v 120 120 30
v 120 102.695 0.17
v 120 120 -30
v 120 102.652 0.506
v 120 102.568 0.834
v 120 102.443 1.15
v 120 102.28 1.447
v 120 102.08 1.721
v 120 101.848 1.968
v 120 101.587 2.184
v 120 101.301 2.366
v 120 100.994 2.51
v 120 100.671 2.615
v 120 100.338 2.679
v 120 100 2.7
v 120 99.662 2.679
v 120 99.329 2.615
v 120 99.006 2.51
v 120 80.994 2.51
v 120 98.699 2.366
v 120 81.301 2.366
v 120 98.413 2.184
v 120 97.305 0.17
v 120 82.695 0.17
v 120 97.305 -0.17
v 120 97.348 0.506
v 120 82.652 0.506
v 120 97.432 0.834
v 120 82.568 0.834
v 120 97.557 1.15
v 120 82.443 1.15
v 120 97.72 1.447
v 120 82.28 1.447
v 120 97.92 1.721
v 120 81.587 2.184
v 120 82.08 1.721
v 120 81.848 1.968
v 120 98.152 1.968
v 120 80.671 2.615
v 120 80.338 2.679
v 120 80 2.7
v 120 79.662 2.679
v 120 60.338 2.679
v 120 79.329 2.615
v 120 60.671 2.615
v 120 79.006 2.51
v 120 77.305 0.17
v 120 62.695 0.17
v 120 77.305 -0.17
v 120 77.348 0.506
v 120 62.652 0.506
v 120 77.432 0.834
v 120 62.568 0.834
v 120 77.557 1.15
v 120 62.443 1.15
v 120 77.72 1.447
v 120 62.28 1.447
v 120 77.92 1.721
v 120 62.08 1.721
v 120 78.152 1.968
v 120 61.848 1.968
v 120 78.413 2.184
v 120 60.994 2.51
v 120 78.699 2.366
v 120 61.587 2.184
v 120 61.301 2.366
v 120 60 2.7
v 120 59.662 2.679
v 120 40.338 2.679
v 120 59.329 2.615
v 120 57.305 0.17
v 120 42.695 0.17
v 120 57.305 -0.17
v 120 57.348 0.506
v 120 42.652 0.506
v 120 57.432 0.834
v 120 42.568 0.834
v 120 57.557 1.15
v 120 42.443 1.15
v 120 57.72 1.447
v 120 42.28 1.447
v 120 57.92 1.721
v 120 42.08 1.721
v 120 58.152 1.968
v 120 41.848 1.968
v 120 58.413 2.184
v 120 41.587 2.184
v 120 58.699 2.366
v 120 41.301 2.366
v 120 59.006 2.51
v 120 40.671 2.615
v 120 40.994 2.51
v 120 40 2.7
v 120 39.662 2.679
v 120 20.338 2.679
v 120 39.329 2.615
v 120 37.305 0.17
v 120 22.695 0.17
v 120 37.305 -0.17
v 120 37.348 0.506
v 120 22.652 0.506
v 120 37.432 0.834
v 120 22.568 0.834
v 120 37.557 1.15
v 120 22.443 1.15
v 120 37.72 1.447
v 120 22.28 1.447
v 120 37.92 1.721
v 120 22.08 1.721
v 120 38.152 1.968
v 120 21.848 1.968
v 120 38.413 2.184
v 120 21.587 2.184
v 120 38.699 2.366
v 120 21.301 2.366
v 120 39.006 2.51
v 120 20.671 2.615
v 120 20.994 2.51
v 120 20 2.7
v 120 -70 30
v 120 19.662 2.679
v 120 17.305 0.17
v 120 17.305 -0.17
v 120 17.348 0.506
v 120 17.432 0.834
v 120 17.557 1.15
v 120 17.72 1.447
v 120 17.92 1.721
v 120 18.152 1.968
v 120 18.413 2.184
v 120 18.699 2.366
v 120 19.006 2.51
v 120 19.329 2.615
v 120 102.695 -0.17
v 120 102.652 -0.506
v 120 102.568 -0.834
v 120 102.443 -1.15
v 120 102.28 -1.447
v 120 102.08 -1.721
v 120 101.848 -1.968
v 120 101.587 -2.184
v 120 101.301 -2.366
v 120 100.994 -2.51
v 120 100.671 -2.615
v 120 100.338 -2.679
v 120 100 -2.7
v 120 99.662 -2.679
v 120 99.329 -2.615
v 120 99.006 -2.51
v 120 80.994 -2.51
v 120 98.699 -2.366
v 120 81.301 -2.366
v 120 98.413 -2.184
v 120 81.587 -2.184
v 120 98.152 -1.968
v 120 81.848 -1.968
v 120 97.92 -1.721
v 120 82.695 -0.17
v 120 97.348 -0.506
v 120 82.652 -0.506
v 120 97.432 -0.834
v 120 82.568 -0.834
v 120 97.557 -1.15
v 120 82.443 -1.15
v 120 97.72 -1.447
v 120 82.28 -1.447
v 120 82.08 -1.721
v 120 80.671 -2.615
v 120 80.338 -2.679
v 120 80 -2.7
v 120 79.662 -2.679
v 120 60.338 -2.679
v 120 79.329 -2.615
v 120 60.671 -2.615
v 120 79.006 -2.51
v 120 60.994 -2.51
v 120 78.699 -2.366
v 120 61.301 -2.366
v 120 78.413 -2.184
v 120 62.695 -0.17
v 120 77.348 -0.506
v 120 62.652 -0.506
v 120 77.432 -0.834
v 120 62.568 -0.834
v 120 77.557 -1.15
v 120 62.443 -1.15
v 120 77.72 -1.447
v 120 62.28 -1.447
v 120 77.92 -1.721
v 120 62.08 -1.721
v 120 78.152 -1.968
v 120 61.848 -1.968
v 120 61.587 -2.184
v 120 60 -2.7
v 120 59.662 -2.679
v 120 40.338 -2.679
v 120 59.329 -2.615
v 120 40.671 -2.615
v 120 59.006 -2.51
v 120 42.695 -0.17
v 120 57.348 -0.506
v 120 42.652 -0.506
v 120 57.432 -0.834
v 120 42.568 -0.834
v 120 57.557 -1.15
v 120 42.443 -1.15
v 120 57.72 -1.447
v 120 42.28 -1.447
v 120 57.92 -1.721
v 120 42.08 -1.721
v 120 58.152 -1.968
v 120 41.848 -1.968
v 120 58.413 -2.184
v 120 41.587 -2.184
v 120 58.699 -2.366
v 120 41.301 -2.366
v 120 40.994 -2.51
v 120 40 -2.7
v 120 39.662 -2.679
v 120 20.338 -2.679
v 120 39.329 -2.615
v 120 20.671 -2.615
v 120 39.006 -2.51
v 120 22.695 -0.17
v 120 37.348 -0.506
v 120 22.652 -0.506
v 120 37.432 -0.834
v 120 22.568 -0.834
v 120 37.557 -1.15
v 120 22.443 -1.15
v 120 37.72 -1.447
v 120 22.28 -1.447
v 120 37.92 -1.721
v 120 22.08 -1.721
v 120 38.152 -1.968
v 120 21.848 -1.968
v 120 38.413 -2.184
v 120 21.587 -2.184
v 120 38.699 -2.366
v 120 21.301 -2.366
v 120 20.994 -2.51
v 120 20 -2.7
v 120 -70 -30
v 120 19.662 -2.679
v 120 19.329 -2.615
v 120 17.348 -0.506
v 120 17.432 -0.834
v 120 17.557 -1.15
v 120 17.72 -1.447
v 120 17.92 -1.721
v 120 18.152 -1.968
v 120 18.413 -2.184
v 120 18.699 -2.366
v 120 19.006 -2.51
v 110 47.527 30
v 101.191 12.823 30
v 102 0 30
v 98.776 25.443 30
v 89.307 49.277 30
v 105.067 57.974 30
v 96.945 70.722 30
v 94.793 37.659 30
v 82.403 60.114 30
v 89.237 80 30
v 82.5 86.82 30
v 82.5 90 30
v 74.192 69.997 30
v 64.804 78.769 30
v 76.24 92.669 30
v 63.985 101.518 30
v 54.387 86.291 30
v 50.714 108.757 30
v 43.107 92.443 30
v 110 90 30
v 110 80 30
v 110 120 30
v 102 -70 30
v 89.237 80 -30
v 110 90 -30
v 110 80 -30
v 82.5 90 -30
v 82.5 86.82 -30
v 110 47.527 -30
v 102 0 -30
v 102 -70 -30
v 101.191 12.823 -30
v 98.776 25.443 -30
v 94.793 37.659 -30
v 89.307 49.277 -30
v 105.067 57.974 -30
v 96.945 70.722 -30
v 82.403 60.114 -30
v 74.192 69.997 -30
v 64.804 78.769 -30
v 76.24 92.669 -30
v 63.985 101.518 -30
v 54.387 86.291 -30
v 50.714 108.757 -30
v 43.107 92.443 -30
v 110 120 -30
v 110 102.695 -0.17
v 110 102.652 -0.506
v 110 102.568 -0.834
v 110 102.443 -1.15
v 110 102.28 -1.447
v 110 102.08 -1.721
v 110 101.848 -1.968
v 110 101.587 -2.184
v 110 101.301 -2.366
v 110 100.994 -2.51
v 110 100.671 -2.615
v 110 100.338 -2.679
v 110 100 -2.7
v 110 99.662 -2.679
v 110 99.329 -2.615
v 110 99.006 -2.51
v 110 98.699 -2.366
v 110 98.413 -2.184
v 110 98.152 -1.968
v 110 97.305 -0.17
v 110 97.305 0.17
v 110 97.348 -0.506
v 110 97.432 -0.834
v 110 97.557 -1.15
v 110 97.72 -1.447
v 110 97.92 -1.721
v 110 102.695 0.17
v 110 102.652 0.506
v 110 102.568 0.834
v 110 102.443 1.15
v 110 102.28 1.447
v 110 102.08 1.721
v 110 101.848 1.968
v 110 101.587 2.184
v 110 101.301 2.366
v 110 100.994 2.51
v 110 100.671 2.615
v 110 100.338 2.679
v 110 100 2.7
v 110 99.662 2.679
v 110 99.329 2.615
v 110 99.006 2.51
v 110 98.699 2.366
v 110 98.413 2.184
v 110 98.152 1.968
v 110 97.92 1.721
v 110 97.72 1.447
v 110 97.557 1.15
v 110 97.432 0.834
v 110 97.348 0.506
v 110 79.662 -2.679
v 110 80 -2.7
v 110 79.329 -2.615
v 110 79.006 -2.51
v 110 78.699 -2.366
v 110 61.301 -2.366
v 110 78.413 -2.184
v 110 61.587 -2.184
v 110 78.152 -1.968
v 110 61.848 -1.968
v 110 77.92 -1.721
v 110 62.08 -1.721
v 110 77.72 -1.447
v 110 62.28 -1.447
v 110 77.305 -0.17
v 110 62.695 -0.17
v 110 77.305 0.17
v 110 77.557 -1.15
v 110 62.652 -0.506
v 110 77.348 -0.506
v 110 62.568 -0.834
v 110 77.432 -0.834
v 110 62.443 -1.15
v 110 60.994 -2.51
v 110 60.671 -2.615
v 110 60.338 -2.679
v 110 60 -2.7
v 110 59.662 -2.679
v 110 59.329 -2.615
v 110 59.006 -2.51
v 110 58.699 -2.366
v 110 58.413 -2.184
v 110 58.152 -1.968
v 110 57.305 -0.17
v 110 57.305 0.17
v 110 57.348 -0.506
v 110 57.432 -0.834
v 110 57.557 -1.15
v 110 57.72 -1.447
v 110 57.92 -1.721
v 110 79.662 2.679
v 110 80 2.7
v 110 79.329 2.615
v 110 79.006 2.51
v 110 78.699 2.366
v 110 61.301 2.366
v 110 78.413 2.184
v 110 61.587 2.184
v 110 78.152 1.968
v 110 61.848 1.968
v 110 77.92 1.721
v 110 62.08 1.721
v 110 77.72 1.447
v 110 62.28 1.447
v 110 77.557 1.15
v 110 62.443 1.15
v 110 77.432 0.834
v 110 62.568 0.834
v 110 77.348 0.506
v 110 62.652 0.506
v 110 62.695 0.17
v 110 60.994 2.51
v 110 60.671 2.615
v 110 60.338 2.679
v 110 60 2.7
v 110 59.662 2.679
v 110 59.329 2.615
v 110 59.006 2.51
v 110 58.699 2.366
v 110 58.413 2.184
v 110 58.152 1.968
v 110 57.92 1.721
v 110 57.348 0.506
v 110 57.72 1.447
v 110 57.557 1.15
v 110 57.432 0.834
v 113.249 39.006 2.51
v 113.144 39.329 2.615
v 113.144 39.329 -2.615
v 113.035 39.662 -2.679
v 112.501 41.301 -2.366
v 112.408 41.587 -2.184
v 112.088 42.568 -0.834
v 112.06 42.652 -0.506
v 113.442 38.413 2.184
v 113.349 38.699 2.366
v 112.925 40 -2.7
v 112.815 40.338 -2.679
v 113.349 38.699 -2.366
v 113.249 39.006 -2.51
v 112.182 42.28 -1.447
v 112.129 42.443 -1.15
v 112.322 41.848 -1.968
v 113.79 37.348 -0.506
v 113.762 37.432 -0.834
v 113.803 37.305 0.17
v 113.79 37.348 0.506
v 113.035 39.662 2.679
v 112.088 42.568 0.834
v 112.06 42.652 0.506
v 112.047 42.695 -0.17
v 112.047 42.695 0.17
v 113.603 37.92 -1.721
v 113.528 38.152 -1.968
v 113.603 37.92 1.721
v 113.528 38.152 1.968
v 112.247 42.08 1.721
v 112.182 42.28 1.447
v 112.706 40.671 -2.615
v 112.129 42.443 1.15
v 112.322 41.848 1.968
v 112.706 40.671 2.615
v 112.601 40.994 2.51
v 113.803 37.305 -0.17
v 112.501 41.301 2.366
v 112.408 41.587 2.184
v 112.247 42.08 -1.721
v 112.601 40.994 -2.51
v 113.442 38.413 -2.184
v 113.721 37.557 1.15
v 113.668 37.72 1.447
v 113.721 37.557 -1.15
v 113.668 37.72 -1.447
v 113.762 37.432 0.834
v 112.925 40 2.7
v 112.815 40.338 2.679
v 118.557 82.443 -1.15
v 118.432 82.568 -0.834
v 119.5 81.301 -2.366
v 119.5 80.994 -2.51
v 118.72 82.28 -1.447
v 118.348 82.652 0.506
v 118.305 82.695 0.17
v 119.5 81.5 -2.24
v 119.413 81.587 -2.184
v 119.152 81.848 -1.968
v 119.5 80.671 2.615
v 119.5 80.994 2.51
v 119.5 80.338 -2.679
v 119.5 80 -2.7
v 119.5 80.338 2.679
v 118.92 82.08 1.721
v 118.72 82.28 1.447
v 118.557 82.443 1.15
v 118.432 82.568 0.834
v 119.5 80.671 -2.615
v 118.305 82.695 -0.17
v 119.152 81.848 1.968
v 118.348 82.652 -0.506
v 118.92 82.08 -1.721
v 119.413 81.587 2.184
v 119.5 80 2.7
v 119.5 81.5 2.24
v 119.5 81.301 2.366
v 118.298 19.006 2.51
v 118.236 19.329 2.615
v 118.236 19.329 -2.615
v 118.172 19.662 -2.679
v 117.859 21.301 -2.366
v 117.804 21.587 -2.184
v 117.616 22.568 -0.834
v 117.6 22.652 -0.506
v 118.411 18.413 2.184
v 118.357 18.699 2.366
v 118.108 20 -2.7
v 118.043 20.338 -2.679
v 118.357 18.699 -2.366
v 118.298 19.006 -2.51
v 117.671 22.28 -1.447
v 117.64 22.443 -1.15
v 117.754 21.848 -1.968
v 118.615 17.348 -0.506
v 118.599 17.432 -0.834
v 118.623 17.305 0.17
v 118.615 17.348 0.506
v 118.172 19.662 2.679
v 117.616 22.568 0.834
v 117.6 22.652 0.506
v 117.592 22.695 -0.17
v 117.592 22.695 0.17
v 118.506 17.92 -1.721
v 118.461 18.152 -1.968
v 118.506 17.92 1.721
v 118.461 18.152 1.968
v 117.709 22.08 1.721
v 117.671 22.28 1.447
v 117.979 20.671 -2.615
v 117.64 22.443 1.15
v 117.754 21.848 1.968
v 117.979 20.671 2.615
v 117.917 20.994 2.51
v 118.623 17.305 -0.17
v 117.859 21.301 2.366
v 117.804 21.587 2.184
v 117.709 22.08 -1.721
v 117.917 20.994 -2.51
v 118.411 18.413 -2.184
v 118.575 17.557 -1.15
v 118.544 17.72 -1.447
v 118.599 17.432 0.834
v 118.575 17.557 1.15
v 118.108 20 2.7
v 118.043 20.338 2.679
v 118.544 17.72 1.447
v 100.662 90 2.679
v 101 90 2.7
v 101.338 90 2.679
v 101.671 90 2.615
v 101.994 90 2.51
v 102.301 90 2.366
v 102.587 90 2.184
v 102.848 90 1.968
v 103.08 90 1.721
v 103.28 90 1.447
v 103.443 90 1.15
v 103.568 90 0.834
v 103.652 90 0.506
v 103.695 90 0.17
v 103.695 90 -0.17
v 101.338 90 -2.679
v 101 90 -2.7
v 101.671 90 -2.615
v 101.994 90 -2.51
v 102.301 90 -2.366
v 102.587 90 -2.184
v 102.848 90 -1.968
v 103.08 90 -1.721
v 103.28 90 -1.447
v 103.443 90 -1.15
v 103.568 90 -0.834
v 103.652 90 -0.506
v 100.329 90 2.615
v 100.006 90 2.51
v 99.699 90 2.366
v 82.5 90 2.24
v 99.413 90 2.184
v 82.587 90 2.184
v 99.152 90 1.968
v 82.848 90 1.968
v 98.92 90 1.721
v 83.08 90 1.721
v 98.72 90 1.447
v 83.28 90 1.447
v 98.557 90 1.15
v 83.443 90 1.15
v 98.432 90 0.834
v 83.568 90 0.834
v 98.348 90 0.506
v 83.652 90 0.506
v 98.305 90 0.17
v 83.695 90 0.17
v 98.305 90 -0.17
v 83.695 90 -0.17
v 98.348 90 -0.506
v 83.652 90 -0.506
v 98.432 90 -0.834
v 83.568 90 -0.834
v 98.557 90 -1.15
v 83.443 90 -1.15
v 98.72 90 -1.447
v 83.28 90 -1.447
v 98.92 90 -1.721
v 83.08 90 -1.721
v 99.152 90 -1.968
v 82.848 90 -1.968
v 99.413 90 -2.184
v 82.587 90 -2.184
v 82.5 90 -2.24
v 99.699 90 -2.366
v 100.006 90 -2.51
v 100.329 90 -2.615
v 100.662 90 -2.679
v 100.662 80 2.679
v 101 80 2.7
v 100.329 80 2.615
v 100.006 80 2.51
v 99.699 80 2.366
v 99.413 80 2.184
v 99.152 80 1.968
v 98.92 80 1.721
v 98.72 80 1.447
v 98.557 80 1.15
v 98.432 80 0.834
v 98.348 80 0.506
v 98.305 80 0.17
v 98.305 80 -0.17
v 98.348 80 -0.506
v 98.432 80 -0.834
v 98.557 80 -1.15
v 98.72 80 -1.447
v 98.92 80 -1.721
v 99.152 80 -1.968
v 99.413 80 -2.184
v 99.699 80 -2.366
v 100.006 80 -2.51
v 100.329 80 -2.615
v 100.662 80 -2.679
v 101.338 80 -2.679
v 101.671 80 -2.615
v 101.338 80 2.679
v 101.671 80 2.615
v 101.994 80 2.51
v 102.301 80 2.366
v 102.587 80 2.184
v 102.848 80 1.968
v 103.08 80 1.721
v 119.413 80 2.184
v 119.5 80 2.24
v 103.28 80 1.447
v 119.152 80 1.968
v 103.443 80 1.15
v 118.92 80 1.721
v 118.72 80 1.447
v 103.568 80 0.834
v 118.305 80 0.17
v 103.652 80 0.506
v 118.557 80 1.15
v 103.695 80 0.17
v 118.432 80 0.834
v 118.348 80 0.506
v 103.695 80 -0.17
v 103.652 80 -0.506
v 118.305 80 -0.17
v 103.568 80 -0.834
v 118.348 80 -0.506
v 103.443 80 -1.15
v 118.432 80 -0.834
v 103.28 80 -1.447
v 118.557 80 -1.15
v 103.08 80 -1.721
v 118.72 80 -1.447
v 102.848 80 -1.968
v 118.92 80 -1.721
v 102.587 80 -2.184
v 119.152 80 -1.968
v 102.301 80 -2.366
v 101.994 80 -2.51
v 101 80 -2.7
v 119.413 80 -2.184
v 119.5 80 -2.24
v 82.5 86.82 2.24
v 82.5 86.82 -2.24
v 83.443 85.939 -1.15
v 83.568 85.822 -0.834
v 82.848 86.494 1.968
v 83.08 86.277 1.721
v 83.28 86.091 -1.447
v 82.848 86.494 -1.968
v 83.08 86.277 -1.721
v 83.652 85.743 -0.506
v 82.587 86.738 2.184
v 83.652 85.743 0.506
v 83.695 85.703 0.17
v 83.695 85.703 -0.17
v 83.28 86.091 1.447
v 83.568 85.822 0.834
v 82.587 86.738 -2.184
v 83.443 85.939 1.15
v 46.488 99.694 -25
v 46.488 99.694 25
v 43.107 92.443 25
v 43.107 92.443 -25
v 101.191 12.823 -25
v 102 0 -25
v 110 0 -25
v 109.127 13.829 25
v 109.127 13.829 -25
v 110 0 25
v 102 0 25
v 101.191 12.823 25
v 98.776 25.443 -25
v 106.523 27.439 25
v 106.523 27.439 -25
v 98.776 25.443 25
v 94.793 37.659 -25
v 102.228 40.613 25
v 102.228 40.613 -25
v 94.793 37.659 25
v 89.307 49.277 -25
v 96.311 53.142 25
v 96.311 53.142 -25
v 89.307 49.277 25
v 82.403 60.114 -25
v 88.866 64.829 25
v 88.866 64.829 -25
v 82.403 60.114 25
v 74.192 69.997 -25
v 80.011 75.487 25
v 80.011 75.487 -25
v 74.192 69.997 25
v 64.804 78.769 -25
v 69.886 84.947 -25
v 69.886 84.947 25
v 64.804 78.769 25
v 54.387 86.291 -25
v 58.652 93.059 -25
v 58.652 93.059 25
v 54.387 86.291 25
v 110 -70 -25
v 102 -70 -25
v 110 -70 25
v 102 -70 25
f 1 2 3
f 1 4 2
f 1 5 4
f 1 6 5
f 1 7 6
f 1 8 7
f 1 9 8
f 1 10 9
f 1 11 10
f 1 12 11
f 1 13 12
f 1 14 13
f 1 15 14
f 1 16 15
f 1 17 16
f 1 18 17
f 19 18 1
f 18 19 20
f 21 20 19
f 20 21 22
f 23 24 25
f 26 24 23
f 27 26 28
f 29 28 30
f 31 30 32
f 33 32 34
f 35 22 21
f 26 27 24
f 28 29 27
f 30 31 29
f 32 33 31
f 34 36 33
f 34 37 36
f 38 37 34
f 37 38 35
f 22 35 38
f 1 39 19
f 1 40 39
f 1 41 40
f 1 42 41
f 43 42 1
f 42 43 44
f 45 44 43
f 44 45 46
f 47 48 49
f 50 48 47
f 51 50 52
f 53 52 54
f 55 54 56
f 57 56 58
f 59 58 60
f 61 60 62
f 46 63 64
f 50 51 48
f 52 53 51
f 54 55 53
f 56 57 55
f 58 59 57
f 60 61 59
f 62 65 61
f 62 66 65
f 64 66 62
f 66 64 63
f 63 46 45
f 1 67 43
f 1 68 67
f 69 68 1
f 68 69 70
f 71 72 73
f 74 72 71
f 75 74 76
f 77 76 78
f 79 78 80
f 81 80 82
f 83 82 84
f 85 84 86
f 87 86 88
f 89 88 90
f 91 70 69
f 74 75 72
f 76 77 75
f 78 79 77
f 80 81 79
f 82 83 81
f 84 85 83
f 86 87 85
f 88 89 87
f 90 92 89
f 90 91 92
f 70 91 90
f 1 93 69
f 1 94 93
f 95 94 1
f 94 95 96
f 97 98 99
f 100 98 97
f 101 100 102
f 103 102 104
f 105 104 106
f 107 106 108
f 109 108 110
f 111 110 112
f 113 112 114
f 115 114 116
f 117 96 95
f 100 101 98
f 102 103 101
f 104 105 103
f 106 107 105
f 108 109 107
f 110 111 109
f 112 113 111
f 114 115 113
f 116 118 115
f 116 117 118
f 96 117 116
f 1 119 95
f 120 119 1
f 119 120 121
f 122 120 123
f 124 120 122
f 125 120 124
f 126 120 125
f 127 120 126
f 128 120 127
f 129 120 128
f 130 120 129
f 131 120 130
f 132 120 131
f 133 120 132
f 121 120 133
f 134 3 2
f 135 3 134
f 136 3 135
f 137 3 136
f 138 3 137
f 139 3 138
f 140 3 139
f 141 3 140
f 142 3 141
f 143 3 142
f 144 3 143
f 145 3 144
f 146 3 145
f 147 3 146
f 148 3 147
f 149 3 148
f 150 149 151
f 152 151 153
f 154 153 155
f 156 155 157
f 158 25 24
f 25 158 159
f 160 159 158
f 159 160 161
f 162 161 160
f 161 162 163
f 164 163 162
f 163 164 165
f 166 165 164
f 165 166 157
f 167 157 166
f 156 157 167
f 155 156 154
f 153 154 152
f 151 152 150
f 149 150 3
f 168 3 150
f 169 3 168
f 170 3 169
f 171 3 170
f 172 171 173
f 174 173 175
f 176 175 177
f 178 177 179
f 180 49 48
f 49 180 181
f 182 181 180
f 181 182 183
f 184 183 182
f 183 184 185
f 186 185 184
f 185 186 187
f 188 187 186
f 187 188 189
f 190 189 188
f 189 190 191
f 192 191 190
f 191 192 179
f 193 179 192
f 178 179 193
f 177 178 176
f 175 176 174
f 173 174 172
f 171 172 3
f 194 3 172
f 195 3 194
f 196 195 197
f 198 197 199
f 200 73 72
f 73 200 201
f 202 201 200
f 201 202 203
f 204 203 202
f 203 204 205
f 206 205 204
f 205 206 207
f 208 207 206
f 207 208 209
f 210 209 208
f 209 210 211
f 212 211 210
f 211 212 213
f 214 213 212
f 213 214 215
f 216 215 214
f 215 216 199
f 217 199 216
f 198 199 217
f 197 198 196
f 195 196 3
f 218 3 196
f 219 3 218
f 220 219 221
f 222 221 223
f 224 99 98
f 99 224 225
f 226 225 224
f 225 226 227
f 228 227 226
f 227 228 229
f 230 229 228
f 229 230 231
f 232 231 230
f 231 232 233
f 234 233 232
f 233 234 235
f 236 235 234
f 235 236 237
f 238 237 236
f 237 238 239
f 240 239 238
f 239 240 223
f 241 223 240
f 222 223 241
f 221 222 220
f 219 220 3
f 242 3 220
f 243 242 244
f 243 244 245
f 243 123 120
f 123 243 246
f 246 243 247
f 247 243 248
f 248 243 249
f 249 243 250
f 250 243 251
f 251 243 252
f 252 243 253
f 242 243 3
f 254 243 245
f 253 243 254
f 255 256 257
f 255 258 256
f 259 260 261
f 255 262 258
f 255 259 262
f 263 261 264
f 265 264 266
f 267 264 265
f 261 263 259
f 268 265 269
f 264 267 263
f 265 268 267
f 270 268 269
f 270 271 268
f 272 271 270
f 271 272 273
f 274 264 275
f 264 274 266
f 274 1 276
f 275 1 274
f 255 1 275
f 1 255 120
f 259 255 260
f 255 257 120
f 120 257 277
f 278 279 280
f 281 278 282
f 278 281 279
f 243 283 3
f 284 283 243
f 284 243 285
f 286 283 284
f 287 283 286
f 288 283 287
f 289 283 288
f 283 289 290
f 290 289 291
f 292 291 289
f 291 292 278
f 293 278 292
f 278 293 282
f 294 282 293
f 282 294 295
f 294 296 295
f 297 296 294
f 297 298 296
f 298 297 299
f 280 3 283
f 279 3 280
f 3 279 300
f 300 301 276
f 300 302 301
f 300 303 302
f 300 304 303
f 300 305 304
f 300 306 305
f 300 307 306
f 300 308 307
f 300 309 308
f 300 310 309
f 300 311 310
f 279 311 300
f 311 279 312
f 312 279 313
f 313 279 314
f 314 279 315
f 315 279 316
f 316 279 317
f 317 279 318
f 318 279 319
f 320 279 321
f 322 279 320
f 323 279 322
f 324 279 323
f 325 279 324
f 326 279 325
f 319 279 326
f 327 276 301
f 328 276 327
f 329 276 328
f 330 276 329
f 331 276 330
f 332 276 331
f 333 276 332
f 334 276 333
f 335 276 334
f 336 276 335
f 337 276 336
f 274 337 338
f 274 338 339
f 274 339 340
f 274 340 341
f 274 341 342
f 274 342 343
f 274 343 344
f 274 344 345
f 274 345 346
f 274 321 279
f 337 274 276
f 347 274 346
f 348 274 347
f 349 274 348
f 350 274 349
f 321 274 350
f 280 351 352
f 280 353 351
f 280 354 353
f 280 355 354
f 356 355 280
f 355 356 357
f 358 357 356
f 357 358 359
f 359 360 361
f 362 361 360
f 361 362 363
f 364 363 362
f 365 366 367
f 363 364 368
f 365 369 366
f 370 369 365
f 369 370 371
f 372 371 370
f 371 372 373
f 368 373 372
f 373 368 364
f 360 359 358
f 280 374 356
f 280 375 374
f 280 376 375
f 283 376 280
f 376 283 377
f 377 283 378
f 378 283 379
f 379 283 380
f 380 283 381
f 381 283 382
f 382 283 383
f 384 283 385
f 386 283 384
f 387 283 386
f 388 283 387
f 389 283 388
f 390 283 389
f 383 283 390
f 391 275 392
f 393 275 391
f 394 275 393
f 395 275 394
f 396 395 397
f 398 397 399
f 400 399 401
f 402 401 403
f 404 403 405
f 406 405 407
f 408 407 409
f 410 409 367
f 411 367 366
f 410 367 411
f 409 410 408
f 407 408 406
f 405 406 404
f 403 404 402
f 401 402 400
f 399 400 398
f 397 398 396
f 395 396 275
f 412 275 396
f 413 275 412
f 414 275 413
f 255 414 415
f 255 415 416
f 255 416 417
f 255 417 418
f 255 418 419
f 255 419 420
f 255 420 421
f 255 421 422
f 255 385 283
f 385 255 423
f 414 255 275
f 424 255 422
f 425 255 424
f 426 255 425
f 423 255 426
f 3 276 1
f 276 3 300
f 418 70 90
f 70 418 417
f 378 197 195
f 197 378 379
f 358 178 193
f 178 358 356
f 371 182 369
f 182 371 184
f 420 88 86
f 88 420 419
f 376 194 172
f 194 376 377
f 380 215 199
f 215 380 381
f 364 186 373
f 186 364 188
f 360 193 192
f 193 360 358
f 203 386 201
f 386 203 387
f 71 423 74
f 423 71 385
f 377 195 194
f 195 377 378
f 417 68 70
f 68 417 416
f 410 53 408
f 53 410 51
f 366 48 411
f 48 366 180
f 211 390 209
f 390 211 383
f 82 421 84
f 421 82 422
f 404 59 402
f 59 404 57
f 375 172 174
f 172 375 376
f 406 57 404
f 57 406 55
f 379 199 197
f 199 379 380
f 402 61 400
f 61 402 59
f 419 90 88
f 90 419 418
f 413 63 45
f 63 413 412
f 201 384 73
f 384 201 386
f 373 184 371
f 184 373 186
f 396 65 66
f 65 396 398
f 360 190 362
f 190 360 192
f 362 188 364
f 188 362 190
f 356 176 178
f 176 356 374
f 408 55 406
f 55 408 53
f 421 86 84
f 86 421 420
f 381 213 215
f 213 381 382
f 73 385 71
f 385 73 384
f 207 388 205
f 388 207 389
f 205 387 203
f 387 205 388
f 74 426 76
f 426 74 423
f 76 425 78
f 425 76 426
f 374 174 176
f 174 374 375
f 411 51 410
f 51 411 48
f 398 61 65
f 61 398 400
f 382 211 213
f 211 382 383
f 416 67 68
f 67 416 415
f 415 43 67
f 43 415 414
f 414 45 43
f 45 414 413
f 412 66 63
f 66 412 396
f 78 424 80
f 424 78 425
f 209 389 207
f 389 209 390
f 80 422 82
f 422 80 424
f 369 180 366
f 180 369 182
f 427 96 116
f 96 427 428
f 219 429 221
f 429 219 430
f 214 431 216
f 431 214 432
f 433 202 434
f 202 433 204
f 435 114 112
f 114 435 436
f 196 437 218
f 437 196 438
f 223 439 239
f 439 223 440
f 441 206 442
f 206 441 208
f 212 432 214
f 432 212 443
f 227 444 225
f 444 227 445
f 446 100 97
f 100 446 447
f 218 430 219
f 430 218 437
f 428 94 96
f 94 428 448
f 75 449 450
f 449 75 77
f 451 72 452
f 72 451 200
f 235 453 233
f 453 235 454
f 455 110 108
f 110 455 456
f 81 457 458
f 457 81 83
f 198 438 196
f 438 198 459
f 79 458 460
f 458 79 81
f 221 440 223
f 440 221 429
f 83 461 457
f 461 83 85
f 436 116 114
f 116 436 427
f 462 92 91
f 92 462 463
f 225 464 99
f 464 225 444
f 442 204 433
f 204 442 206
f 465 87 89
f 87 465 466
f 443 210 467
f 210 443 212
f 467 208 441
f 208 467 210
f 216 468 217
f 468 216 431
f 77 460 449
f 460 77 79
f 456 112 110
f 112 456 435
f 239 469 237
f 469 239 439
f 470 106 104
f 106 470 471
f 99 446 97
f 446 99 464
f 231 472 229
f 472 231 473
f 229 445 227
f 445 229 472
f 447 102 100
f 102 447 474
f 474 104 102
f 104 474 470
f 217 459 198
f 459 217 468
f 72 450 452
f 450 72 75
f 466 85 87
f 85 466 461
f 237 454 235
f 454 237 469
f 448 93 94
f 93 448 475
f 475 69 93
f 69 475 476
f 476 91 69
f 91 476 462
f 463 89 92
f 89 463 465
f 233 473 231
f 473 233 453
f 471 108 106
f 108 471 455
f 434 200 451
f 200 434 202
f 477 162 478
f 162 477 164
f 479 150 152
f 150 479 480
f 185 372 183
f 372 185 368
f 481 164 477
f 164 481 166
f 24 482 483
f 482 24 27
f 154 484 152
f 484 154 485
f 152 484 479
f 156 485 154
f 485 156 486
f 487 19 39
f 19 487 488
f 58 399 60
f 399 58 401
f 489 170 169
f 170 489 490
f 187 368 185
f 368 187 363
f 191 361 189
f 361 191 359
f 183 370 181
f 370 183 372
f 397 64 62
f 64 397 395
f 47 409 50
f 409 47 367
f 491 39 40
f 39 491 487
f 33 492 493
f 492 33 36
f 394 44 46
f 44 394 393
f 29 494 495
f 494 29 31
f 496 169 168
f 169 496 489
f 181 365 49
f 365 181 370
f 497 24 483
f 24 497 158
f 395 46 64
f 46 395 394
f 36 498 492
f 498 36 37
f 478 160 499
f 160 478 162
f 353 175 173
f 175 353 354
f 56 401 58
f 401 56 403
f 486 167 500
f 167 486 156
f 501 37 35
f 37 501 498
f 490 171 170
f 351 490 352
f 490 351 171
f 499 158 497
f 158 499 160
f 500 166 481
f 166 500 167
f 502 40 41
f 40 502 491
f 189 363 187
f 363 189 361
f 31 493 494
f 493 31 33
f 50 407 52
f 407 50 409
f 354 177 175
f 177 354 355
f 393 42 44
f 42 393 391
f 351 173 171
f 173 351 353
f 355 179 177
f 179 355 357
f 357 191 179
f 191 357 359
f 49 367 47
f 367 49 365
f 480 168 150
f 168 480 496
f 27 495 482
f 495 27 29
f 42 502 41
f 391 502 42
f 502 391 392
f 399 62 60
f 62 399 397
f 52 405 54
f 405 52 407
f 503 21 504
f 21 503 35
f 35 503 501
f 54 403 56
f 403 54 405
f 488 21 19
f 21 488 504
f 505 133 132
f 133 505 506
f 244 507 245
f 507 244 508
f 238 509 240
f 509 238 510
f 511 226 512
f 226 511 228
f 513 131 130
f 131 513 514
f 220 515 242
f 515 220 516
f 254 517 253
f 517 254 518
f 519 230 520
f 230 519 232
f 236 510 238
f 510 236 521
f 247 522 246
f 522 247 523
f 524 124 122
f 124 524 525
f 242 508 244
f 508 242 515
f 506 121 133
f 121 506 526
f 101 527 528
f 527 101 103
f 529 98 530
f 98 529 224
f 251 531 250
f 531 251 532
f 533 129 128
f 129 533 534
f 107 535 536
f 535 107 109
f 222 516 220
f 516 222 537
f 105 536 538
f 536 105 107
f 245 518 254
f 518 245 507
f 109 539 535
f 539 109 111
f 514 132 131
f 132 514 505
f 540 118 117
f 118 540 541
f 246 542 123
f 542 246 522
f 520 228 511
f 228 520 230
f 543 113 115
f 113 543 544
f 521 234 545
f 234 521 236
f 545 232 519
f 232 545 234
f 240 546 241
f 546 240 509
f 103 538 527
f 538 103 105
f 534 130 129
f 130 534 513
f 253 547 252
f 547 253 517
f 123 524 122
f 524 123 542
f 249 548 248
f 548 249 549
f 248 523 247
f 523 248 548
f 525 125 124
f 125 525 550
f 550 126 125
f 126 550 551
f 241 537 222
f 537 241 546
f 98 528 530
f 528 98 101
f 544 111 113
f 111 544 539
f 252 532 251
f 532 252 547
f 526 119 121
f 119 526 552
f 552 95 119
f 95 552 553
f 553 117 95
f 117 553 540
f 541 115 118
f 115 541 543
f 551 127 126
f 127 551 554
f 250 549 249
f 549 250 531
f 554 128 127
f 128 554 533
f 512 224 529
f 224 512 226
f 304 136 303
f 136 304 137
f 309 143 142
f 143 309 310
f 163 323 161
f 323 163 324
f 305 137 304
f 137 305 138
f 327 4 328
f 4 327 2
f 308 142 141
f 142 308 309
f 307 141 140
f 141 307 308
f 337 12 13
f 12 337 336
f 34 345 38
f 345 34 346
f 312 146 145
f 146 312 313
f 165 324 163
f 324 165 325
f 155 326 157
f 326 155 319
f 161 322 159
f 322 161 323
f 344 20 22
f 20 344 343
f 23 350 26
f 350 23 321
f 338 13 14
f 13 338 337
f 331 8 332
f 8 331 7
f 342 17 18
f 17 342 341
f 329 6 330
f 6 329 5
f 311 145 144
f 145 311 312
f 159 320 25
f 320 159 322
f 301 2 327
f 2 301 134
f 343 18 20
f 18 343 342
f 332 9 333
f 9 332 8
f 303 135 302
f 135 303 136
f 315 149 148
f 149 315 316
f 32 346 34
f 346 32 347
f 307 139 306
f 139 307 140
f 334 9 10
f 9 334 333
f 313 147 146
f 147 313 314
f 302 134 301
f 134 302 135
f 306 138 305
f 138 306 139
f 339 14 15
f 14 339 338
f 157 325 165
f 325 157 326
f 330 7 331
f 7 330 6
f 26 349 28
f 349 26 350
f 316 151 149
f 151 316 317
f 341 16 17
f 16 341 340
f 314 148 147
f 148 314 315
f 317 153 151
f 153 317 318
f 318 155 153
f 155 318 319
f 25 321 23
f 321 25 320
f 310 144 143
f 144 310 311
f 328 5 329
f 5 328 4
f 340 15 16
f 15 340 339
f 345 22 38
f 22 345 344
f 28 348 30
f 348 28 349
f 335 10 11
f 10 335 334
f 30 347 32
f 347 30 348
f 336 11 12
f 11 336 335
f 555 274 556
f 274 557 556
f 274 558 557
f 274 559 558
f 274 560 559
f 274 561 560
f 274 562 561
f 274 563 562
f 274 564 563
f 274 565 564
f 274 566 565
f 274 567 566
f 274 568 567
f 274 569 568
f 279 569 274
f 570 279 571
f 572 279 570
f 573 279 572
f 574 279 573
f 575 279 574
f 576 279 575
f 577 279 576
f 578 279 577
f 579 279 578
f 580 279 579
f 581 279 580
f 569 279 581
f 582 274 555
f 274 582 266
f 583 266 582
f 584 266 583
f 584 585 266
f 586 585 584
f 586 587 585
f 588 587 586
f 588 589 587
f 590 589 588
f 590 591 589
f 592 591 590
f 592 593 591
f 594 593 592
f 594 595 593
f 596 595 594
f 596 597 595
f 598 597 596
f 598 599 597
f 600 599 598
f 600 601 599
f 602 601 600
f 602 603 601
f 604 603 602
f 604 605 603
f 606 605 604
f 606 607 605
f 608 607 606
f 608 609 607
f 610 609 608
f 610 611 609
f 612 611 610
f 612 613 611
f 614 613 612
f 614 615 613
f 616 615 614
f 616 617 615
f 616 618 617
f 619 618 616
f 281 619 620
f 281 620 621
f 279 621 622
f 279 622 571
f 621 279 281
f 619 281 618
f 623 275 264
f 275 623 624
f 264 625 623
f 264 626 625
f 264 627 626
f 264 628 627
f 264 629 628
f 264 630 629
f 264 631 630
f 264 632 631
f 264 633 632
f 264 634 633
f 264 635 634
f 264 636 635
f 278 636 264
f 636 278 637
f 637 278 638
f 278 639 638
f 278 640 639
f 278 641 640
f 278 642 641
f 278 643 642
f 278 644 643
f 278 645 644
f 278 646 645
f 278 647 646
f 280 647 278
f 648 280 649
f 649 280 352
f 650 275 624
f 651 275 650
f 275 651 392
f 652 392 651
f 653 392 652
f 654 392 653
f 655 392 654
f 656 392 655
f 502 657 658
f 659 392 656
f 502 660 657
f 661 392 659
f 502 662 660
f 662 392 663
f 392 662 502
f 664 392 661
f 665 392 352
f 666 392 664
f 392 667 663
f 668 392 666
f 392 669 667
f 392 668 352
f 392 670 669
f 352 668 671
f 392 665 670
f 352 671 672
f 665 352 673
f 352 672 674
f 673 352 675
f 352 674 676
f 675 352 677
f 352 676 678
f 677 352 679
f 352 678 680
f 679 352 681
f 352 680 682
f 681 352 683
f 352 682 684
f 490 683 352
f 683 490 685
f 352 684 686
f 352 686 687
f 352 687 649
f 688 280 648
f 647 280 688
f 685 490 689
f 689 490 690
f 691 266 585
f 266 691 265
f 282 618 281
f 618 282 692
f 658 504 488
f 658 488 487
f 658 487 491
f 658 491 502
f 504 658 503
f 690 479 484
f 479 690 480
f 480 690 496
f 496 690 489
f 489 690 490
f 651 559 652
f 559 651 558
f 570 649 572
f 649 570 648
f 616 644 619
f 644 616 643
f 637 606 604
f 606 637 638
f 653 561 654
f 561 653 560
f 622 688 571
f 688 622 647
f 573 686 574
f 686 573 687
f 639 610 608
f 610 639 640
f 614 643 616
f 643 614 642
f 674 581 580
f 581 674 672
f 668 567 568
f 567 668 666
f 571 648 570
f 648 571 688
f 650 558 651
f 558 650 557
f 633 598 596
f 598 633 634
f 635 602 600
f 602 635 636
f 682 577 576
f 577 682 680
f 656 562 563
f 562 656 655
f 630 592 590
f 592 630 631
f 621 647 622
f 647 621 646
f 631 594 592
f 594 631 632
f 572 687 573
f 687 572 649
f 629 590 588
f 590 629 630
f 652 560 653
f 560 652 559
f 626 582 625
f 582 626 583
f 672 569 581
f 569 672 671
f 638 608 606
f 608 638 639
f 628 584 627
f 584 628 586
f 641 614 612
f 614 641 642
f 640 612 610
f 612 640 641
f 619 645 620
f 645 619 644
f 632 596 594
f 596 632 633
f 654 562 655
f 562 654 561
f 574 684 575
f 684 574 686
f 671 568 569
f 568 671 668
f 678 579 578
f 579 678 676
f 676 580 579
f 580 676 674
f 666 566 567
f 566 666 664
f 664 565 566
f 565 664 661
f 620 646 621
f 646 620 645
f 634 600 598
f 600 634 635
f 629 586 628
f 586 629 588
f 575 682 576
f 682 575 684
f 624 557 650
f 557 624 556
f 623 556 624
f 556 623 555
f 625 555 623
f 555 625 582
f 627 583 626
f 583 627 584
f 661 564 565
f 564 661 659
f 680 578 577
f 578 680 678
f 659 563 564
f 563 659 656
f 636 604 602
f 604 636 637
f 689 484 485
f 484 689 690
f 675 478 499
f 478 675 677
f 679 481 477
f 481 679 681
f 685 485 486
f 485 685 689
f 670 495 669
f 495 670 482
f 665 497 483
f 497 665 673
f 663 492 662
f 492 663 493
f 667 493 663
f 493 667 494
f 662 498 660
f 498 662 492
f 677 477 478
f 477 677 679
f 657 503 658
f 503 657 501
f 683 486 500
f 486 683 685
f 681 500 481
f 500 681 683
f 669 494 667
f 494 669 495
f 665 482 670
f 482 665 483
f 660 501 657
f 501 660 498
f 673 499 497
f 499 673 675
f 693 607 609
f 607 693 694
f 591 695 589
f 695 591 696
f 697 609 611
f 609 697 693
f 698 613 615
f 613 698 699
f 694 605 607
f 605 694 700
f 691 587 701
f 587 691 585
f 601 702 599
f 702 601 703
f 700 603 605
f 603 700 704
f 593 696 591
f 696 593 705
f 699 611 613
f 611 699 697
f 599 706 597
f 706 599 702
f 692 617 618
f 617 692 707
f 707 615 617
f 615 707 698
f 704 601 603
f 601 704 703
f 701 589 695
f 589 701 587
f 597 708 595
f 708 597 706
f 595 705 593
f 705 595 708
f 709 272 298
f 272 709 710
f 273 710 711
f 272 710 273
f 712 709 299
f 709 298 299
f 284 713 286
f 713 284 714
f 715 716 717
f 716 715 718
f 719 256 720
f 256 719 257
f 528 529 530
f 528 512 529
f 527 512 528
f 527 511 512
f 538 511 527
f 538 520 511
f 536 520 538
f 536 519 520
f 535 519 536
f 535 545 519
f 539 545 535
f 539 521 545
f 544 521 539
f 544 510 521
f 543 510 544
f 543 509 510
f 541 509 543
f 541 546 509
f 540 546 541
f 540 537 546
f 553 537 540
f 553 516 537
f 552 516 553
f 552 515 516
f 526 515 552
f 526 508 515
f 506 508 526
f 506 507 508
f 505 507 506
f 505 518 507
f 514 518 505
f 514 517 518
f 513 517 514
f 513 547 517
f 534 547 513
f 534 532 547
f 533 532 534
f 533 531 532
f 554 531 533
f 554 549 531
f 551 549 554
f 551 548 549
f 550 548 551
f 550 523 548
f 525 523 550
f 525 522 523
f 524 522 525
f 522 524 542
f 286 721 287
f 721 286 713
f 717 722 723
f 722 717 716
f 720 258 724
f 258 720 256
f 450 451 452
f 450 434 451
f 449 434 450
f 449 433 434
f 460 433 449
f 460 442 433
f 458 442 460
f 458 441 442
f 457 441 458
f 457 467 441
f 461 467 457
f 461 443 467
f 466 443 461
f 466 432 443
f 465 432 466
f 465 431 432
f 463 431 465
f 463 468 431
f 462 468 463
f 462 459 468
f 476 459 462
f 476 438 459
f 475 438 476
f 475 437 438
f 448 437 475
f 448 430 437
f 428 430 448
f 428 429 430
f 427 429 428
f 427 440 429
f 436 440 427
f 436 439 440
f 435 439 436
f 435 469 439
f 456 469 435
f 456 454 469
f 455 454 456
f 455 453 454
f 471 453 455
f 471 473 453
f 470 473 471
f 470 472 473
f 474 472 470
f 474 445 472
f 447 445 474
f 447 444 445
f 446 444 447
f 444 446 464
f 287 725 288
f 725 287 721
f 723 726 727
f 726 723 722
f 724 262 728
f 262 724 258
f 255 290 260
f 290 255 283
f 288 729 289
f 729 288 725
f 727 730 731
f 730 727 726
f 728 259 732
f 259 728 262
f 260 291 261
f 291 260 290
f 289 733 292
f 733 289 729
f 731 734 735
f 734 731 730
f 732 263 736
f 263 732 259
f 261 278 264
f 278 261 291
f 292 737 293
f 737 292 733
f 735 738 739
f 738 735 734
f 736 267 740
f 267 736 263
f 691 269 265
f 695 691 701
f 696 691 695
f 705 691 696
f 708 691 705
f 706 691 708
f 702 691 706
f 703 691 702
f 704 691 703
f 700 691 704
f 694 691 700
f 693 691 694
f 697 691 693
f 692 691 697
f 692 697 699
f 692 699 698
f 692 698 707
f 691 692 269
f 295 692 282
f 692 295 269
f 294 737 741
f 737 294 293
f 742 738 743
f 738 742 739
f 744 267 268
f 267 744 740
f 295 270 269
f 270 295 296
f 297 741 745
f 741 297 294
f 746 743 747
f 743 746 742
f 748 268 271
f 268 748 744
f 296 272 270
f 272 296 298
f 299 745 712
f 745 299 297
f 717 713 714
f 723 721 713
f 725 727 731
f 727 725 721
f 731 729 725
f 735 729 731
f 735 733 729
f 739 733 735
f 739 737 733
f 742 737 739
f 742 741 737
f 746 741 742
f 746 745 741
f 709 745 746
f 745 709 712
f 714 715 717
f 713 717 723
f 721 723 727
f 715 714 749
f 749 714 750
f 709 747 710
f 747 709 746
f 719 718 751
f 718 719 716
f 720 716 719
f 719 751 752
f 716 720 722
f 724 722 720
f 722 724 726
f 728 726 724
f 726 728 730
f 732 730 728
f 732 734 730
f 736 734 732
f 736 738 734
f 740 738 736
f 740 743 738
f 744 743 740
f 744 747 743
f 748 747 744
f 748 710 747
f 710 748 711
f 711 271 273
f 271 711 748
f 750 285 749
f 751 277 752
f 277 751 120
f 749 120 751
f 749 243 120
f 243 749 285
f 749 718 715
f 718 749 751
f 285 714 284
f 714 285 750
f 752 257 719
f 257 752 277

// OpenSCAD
// file: params.scad
/* Parameters */ 
// All lenghts are in mm

$fn = 50;

WHEEL_MAX_RAD = 60;
INNER_RIM_RAD = 50;


TENNIS_BALL_CURAVTURE_RAD = 33;

CURVE_FACETS = 100;

BALL_CURAVTURE_RAD = 60;

X_DIM =WHEEL_MAX_RAD - INNER_RIM_RAD;
Y_DIM = 2*TENNIS_BALL_CURAVTURE_RAD - 15;

FILLER_HEIGHT = 10;

BOLT_COUNT = 6;
BOLT_SPREAD = 35;
BOLT_DIM = 5.4;
CENTER_DIM = 6.4;

MAKE_HALF = true;

/* Skirt parameters */

BALL_TRAVEL_SPACE = 50;
SKIRT_THICKNESS = 10;
SKIRT_RADIUS_OFFSET = 60;
RAIL_WIDTH = 8;
RAIL_HEIGHT = 5;
DROP_TANGENT_LENGTH = 70;

/* Assembly Params */


SPINE_HEIGHT = 400;
SPINE_WIDTH = 70;
SPINE_THICKNESS = 30;

WHEEL_SPINE_GAP = 10;

BOTTOM_WHEEL_GAP_TO_FLOOR = 20;

GAP_BETWEEN_SERVER_WHEELS = 50;
// main file
include <params.scad>

RAD = WHEEL_MAX_RAD - (X_DIM / 2);
SKIRT_RAD = RAD + SKIRT_RADIUS_OFFSET;
SKIRT_WIDTH = BALL_TRAVEL_SPACE + 2 * RAIL_HEIGHT;


wheelSkirt();

module wheelSkirt()
{
    union()
    {
        ballSlideCurve();
        skirtSupport();
        dropTangent();

    }
}

module ballSlideCurve()
{
    rotate_extrude(angle = 65, convexity = 9) 
    2dSkirt(); 
}

module 2dSkirt()
{

    SKIRT_SQUARE_X = SKIRT_THICKNESS;

    RAIL_X = SKIRT_RAD - (SKIRT_SQUARE_X / 2) - (RAIL_WIDTH / 2);
    RAIL_Y = -(SKIRT_WIDTH / 2) + (RAIL_HEIGHT / 2);
    union()
    {

        translate([ SKIRT_RAD, 0, 0 ])
            square([ SKIRT_SQUARE_X, SKIRT_WIDTH ], center = true);

        // Fall protection rails
        translate([ RAIL_X, RAIL_Y, 0 ])
            square([ RAIL_WIDTH, RAIL_HEIGHT ], center = true);
        translate([ RAIL_X, -RAIL_Y, 0 ])
            square([ RAIL_WIDTH, RAIL_HEIGHT ], center = true);
    }
}




SUPP_HEIGHT = SKIRT_RAD + X_DIM / 2;

module skirtSupport(){


    color("red")
        supportCube();

    color("orange") 
        translate([SUPP_HEIGHT+41,-30,0]) rotate([0,0,90]) supportCube(83);

}

module supportCube(h=0){
    HOLE_OFFSET = 20;

        translate([ SKIRT_RAD, SUPP_HEIGHT / 2, 0 ])
            difference(){
                cube([ X_DIM, SUPP_HEIGHT-h, SKIRT_WIDTH ], center = true);
                supportHole();
                translate([0,-HOLE_OFFSET,0])supportHole();
                translate([0,HOLE_OFFSET,0])supportHole();
                translate([0,-2*HOLE_OFFSET,0])supportHole();
                translate([0,2*HOLE_OFFSET,0])supportHole();
            }
}
module supportHole()
{
    rotate([0,90,0]) cylinder(r=BOLT_DIM/2,h=20, center=true);
}

module dropTangent()
{
    translate([0,-(DROP_TANGENT_LENGTH/2),0]) 
        rotate([90,0,0]) 
//            color("blue") 
                linear_extrude(height = DROP_TANGENT_LENGTH, center = true, convexity = 10, twist =0)
                    2dSkirt();
}
